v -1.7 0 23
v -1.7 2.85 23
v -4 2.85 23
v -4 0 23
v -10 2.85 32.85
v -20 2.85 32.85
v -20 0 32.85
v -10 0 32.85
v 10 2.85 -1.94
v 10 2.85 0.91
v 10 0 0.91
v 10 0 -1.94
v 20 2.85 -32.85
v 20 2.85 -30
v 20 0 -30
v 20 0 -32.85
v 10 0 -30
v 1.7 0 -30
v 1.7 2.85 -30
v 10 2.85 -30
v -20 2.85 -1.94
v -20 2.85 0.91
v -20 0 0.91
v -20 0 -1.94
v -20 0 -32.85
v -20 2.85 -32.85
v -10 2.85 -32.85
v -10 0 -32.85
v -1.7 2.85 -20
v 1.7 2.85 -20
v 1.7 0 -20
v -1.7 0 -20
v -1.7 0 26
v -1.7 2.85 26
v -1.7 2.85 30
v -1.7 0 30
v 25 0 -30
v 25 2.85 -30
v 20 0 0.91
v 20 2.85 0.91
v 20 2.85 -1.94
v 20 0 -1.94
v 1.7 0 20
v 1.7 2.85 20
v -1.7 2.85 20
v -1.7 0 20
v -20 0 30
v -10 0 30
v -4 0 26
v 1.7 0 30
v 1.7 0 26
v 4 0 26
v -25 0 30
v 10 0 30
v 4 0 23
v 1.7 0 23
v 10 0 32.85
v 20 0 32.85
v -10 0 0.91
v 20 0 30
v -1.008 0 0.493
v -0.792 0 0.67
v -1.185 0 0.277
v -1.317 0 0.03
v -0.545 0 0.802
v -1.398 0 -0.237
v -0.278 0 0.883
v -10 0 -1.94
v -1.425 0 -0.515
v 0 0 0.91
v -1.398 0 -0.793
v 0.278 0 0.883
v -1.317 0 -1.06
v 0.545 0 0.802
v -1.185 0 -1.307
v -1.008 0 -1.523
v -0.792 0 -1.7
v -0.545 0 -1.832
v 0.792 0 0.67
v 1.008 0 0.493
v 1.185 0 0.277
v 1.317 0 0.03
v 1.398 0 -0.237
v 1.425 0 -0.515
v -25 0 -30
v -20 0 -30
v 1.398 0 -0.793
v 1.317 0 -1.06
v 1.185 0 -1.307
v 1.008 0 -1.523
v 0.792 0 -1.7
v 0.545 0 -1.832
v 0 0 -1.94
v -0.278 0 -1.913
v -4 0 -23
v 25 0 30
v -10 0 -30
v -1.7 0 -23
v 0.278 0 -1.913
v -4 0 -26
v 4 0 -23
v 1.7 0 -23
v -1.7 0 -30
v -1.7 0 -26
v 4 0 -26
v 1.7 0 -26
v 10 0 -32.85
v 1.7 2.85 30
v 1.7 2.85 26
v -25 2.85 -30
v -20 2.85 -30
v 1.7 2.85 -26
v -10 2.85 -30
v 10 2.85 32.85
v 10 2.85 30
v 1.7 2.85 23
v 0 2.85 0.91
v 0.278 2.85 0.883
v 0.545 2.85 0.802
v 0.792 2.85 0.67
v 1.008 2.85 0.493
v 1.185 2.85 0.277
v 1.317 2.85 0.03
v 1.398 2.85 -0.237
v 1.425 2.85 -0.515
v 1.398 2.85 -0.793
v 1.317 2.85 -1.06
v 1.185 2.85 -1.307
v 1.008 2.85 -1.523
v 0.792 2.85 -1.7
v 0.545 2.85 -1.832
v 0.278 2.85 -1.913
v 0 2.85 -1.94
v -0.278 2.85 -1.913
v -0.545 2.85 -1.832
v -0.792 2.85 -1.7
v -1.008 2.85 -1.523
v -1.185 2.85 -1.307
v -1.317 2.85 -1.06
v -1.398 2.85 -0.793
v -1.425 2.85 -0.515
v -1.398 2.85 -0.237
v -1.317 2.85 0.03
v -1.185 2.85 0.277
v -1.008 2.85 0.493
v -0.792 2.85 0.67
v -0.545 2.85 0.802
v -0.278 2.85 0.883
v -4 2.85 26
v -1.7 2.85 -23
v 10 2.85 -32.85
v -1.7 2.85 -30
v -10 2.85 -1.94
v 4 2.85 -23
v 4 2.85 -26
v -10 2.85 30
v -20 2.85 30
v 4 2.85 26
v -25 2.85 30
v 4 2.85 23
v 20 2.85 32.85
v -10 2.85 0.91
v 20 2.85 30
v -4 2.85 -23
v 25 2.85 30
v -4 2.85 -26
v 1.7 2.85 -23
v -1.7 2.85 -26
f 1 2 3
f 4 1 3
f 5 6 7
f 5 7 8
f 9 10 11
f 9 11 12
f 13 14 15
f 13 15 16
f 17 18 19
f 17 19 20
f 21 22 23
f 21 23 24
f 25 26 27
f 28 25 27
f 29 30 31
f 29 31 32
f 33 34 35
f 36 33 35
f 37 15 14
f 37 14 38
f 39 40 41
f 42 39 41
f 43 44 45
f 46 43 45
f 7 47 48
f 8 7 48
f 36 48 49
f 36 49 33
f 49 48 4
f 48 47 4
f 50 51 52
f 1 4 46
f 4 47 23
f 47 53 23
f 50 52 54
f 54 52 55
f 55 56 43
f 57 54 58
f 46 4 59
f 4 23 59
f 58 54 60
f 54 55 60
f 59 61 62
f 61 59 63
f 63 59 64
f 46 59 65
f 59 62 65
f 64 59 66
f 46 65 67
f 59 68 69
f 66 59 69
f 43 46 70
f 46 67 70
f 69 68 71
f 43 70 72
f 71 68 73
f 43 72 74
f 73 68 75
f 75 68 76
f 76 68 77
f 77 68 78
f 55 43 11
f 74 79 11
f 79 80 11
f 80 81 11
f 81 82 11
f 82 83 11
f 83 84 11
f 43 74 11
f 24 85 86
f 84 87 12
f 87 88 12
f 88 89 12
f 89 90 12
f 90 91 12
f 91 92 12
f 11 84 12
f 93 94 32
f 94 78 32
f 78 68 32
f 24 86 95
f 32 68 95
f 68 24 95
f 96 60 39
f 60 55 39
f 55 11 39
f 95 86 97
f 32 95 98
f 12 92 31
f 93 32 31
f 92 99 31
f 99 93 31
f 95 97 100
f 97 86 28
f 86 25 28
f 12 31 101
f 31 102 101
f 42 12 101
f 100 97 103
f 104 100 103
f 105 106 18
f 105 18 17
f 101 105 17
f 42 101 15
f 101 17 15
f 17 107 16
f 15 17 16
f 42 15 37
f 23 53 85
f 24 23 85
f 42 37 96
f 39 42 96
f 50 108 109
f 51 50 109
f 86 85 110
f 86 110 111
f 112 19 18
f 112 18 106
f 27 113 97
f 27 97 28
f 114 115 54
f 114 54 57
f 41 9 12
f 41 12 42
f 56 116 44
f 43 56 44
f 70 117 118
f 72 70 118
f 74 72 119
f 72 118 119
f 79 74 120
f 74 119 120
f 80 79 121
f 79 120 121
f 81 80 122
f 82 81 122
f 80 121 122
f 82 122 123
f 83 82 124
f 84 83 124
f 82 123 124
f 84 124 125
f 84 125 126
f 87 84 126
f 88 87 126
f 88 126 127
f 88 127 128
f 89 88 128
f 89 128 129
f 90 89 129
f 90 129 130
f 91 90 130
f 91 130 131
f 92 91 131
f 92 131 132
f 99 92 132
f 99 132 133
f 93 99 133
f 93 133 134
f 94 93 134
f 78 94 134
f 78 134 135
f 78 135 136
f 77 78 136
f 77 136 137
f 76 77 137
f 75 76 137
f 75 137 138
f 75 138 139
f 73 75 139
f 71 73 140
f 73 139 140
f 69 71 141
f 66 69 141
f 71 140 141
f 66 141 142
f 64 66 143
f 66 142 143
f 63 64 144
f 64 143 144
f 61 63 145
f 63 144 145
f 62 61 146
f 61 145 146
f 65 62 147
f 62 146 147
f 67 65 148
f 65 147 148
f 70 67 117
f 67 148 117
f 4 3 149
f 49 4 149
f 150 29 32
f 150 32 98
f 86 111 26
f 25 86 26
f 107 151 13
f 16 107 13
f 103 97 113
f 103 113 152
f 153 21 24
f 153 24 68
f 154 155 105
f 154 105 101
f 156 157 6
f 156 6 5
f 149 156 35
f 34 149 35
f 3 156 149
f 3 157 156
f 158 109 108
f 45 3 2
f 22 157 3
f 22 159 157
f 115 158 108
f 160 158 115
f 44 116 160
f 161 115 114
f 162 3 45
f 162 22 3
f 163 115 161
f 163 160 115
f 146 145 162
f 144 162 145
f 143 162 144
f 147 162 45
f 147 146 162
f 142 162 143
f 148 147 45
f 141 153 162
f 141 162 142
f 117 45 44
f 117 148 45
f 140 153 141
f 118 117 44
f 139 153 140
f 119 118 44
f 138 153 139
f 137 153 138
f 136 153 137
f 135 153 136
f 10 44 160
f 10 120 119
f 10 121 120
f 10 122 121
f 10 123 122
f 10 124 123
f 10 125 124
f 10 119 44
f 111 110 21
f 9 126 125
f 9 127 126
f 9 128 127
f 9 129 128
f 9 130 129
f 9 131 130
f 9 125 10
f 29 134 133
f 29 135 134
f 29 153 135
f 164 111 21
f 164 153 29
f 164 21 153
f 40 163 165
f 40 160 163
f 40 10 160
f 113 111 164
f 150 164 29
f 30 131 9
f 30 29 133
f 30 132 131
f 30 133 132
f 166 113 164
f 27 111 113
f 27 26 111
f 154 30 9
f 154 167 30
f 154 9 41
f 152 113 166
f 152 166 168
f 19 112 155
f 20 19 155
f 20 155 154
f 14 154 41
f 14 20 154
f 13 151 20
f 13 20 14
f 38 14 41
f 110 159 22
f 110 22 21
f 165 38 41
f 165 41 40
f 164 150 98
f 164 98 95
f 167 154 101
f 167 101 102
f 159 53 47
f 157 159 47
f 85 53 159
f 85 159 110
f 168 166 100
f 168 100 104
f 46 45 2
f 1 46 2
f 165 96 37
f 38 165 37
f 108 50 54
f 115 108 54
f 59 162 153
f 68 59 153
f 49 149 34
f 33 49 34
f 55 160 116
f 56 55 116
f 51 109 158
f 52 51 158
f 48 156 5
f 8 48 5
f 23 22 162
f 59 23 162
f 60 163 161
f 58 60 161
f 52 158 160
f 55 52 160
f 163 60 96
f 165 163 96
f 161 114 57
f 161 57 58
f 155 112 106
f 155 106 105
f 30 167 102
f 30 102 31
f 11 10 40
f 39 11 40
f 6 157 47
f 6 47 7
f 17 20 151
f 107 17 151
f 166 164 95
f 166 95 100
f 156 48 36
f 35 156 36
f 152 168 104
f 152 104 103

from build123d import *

# Parameters (mm, degrees)
SKETCH1_W           = 50
SKETCH1_H           = 60
BOSS_EXTRUDE1_DEPTH = 2.85
SKETCH2_W           = 10
SKETCH2_H           = 2.85
BOSS_EXTRUDE2_DEPTH = 2.85
CUT_EXTRUDE1_DEPTH  = 42.379282256
SKETCH4_R           = 1.425
SKETCH4_W           = 10
SKETCH4_H           = 2.85
CUT_EXTRUDE2_DEPTH  = 42.379282256


with BuildPart() as part:
    # Sketch1 → Boss-Extrude1 (new body)
    with BuildSketch(Plane(origin=(0, 0, 0), x_dir=(1, 0, 0), z_dir=(0, 1, 0))):
        Rectangle(SKETCH1_W, SKETCH1_H)
    extrude(amount=BOSS_EXTRUDE1_DEPTH)

    # Sketch2 → Boss-Extrude2 (add)
    with BuildSketch(Plane(origin=(0, 2.85, 0), x_dir=(1, 0, 0), z_dir=(0, 1, 0))):
        with Locations((-15, 31.425)):
            Rectangle(SKETCH2_W, SKETCH2_H)
        with Locations((15, 31.425)):
            Rectangle(SKETCH2_W, SKETCH2_H)
    boss_extrude2 = extrude(amount=-BOSS_EXTRUDE2_DEPTH)

    # Sketch3 → Cut-Extrude1 (cut, through all)
    with BuildSketch(Plane(origin=(0, 2.85, 0), x_dir=(1, 0, 0), z_dir=(0, 1, 0))):
        Polygon((-4, 26), (-1.7, 26), (-1.7, 30), (1.7, 30), (1.7, 26), (4, 26), (4, 23), (1.7, 23), (1.7, 20), (-1.7, 20), (-1.7, 23), (-4, 23), align=None)
    cut_extrude1 = extrude(amount=-CUT_EXTRUDE1_DEPTH, mode=Mode.SUBTRACT)

    # Mirror1: Boss-Extrude2, Cut-Extrude1 across plane
    add(boss_extrude2.mirror(Plane.XY))
    add(cut_extrude1.mirror(Plane.XY), mode=Mode.SUBTRACT)

    # Sketch4 → Cut-Extrude2 (cut, through all)
    with BuildSketch(Plane(origin=(0, 2.85, 0), x_dir=(1, 0, 0), z_dir=(0, 1, 0))):
        with Locations(Location((0, 0.515, 0), (0, 0, 270))):
            Circle(SKETCH4_R)
        with Locations((-15, 0.515)):
            Rectangle(SKETCH4_W, SKETCH4_H)
        with Locations((15, 0.515)):
            Rectangle(SKETCH4_W, SKETCH4_H)
    extrude(amount=-CUT_EXTRUDE2_DEPTH, mode=Mode.SUBTRACT)


solid = part.part
